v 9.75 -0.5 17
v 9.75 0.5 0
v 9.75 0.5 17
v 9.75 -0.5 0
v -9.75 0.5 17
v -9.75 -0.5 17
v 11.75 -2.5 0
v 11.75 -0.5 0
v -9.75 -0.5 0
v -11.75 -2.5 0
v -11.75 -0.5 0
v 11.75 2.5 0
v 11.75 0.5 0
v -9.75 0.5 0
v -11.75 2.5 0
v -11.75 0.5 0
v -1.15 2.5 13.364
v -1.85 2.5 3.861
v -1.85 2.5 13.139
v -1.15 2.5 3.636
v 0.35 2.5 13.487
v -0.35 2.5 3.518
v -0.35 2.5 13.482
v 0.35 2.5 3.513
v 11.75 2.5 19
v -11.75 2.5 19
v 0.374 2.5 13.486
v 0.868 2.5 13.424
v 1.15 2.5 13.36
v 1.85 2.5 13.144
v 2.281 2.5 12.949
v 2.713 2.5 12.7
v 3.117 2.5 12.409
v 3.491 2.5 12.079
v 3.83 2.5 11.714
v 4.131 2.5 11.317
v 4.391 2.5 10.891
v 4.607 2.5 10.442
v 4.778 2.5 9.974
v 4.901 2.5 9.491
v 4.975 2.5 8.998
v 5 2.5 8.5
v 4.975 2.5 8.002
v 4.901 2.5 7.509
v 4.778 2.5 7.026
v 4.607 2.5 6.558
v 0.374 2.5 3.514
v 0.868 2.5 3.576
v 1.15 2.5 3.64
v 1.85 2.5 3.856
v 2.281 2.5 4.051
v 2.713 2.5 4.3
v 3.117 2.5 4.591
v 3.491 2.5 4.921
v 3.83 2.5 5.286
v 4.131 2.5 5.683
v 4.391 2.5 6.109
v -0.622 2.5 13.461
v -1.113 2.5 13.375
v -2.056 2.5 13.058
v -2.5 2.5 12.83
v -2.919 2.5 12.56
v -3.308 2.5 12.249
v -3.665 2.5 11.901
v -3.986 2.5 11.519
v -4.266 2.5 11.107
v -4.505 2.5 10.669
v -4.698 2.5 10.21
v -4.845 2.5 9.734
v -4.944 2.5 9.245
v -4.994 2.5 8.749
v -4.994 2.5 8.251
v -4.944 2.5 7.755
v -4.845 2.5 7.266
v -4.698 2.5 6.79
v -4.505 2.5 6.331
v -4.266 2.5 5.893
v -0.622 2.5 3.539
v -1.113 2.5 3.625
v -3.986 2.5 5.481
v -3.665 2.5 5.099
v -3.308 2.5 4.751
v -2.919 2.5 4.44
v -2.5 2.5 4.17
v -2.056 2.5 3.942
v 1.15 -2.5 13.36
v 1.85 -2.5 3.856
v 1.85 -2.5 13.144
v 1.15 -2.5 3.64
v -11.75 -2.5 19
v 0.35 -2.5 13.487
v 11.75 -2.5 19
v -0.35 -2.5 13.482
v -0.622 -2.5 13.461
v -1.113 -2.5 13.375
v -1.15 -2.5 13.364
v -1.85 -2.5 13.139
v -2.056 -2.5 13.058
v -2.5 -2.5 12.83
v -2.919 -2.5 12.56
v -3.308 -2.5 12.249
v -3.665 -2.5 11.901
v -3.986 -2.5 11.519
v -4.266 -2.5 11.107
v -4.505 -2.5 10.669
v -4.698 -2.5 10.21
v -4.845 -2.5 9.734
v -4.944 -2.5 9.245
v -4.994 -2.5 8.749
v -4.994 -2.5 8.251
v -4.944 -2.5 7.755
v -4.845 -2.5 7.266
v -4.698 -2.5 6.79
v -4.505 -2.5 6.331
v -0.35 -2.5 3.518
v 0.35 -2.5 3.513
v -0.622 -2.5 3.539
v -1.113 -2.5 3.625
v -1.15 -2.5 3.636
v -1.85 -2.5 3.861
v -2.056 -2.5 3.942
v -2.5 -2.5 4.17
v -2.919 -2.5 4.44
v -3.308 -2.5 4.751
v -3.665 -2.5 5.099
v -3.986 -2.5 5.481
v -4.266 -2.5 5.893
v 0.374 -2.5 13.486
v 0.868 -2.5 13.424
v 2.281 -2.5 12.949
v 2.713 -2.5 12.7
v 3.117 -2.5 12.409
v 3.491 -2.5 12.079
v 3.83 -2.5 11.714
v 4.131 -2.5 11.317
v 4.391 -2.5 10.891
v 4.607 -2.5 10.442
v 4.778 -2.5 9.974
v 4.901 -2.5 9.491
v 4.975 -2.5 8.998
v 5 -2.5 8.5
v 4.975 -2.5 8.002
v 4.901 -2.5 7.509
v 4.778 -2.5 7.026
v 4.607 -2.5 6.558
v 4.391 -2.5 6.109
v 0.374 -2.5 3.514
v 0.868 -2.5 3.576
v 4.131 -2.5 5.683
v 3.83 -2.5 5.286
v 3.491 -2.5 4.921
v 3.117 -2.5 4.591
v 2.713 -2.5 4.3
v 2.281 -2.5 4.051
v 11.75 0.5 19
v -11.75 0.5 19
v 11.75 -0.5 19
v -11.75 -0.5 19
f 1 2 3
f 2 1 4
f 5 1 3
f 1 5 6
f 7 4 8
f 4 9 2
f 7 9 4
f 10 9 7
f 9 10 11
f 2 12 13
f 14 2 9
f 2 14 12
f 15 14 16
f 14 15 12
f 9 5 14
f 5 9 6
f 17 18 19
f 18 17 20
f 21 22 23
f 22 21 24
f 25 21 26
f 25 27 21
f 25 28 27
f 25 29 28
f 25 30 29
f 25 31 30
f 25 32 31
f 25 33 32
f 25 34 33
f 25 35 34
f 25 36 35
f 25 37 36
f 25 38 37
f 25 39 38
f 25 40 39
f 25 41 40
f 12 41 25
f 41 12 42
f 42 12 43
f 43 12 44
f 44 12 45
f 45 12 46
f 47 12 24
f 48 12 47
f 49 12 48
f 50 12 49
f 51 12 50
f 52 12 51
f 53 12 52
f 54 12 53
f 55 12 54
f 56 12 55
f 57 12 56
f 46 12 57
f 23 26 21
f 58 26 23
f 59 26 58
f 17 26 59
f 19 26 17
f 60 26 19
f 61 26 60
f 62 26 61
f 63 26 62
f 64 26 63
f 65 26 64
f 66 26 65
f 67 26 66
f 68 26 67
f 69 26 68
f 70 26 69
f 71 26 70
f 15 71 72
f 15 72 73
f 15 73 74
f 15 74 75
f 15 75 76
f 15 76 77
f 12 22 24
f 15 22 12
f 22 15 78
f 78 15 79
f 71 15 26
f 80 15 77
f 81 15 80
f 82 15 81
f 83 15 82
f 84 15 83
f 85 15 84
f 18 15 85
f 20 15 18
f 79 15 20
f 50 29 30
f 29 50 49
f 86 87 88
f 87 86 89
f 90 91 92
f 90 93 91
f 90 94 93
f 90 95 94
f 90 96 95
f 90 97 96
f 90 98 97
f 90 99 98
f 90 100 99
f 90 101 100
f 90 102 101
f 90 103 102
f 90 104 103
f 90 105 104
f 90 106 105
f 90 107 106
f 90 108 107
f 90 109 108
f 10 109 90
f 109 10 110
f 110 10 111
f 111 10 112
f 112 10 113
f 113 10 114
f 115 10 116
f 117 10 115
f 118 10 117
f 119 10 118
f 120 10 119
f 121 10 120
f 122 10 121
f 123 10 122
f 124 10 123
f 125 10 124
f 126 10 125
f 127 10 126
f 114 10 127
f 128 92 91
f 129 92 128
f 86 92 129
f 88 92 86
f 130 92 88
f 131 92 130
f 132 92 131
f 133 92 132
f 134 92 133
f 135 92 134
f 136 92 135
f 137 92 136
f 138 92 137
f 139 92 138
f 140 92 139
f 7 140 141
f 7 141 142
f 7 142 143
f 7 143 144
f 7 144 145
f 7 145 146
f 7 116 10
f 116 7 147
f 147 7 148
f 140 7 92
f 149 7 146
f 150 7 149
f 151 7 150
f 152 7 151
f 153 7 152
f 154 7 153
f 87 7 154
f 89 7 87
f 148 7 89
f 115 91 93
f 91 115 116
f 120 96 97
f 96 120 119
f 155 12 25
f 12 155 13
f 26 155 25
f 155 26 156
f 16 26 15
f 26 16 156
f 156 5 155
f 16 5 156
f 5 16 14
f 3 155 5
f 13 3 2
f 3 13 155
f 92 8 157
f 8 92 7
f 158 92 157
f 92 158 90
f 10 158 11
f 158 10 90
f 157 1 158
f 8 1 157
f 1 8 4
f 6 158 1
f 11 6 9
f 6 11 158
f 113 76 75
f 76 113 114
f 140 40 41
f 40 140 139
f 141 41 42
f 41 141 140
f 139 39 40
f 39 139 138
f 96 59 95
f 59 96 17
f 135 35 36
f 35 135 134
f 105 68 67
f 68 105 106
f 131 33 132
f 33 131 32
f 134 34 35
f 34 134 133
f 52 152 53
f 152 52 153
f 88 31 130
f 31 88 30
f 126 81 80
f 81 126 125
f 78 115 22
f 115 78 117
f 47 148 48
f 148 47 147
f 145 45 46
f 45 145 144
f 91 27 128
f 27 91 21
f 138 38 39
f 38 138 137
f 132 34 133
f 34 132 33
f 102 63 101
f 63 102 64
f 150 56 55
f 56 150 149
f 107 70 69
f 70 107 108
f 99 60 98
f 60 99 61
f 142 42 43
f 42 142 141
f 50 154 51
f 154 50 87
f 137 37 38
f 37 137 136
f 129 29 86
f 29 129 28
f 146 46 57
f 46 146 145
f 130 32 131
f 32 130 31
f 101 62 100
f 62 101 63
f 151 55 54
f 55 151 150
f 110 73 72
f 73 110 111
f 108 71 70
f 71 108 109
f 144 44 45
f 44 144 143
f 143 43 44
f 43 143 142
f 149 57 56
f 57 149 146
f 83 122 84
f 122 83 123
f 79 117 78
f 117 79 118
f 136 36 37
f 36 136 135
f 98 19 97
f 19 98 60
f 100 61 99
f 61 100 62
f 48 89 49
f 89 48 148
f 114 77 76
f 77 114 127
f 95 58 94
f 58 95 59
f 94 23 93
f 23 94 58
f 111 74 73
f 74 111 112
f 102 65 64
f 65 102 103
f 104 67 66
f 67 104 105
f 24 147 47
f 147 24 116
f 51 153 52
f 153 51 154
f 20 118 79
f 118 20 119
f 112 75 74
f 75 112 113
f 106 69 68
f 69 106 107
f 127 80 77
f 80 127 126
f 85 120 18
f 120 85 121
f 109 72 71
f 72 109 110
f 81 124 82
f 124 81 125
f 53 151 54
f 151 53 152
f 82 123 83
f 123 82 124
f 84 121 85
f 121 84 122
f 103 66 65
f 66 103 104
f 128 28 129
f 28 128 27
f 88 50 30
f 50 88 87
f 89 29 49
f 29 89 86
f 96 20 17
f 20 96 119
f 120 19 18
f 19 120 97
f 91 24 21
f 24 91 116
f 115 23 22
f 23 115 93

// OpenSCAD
module feedthrough (w=19.5, h=17, r=10, md=1, od=2, oh=2)
{
    difference () {
        union () {
            translate ([0, 0, h / 2])
                cube ([w, md + 2 * od, h], center = true);
            translate ([0,  md / 2 + od / 2, h / 2 + oh / 2])
                cube ([w + 2 * oh, od, h + oh], center = true);
            translate ([0, -md / 2 - od / 2, h / 2 + oh / 2])
                cube ([w + 2 * oh, od, h + oh], center = true);
        }
        translate ([0, 0, h / 2])
            rotate ([90, 0, 0])
                cylinder (r = r / 2, h = 2 * (md + 2 * od), center = true);
    }
    // Support material
    translate ([ 0.15 * r, 0, h / 2])
        cube ([0.7, md + 2 * od, h], center = true);
    translate ([-0.15 * r, 0, h / 2])
        cube ([0.7, md + 2 * od, h], center = true);
    translate ([0, 0, h / 2])
        cube ([0.7, md + 2 * od, h], center = true);
}

feedthrough ($fa = 5, $fs = .5);
